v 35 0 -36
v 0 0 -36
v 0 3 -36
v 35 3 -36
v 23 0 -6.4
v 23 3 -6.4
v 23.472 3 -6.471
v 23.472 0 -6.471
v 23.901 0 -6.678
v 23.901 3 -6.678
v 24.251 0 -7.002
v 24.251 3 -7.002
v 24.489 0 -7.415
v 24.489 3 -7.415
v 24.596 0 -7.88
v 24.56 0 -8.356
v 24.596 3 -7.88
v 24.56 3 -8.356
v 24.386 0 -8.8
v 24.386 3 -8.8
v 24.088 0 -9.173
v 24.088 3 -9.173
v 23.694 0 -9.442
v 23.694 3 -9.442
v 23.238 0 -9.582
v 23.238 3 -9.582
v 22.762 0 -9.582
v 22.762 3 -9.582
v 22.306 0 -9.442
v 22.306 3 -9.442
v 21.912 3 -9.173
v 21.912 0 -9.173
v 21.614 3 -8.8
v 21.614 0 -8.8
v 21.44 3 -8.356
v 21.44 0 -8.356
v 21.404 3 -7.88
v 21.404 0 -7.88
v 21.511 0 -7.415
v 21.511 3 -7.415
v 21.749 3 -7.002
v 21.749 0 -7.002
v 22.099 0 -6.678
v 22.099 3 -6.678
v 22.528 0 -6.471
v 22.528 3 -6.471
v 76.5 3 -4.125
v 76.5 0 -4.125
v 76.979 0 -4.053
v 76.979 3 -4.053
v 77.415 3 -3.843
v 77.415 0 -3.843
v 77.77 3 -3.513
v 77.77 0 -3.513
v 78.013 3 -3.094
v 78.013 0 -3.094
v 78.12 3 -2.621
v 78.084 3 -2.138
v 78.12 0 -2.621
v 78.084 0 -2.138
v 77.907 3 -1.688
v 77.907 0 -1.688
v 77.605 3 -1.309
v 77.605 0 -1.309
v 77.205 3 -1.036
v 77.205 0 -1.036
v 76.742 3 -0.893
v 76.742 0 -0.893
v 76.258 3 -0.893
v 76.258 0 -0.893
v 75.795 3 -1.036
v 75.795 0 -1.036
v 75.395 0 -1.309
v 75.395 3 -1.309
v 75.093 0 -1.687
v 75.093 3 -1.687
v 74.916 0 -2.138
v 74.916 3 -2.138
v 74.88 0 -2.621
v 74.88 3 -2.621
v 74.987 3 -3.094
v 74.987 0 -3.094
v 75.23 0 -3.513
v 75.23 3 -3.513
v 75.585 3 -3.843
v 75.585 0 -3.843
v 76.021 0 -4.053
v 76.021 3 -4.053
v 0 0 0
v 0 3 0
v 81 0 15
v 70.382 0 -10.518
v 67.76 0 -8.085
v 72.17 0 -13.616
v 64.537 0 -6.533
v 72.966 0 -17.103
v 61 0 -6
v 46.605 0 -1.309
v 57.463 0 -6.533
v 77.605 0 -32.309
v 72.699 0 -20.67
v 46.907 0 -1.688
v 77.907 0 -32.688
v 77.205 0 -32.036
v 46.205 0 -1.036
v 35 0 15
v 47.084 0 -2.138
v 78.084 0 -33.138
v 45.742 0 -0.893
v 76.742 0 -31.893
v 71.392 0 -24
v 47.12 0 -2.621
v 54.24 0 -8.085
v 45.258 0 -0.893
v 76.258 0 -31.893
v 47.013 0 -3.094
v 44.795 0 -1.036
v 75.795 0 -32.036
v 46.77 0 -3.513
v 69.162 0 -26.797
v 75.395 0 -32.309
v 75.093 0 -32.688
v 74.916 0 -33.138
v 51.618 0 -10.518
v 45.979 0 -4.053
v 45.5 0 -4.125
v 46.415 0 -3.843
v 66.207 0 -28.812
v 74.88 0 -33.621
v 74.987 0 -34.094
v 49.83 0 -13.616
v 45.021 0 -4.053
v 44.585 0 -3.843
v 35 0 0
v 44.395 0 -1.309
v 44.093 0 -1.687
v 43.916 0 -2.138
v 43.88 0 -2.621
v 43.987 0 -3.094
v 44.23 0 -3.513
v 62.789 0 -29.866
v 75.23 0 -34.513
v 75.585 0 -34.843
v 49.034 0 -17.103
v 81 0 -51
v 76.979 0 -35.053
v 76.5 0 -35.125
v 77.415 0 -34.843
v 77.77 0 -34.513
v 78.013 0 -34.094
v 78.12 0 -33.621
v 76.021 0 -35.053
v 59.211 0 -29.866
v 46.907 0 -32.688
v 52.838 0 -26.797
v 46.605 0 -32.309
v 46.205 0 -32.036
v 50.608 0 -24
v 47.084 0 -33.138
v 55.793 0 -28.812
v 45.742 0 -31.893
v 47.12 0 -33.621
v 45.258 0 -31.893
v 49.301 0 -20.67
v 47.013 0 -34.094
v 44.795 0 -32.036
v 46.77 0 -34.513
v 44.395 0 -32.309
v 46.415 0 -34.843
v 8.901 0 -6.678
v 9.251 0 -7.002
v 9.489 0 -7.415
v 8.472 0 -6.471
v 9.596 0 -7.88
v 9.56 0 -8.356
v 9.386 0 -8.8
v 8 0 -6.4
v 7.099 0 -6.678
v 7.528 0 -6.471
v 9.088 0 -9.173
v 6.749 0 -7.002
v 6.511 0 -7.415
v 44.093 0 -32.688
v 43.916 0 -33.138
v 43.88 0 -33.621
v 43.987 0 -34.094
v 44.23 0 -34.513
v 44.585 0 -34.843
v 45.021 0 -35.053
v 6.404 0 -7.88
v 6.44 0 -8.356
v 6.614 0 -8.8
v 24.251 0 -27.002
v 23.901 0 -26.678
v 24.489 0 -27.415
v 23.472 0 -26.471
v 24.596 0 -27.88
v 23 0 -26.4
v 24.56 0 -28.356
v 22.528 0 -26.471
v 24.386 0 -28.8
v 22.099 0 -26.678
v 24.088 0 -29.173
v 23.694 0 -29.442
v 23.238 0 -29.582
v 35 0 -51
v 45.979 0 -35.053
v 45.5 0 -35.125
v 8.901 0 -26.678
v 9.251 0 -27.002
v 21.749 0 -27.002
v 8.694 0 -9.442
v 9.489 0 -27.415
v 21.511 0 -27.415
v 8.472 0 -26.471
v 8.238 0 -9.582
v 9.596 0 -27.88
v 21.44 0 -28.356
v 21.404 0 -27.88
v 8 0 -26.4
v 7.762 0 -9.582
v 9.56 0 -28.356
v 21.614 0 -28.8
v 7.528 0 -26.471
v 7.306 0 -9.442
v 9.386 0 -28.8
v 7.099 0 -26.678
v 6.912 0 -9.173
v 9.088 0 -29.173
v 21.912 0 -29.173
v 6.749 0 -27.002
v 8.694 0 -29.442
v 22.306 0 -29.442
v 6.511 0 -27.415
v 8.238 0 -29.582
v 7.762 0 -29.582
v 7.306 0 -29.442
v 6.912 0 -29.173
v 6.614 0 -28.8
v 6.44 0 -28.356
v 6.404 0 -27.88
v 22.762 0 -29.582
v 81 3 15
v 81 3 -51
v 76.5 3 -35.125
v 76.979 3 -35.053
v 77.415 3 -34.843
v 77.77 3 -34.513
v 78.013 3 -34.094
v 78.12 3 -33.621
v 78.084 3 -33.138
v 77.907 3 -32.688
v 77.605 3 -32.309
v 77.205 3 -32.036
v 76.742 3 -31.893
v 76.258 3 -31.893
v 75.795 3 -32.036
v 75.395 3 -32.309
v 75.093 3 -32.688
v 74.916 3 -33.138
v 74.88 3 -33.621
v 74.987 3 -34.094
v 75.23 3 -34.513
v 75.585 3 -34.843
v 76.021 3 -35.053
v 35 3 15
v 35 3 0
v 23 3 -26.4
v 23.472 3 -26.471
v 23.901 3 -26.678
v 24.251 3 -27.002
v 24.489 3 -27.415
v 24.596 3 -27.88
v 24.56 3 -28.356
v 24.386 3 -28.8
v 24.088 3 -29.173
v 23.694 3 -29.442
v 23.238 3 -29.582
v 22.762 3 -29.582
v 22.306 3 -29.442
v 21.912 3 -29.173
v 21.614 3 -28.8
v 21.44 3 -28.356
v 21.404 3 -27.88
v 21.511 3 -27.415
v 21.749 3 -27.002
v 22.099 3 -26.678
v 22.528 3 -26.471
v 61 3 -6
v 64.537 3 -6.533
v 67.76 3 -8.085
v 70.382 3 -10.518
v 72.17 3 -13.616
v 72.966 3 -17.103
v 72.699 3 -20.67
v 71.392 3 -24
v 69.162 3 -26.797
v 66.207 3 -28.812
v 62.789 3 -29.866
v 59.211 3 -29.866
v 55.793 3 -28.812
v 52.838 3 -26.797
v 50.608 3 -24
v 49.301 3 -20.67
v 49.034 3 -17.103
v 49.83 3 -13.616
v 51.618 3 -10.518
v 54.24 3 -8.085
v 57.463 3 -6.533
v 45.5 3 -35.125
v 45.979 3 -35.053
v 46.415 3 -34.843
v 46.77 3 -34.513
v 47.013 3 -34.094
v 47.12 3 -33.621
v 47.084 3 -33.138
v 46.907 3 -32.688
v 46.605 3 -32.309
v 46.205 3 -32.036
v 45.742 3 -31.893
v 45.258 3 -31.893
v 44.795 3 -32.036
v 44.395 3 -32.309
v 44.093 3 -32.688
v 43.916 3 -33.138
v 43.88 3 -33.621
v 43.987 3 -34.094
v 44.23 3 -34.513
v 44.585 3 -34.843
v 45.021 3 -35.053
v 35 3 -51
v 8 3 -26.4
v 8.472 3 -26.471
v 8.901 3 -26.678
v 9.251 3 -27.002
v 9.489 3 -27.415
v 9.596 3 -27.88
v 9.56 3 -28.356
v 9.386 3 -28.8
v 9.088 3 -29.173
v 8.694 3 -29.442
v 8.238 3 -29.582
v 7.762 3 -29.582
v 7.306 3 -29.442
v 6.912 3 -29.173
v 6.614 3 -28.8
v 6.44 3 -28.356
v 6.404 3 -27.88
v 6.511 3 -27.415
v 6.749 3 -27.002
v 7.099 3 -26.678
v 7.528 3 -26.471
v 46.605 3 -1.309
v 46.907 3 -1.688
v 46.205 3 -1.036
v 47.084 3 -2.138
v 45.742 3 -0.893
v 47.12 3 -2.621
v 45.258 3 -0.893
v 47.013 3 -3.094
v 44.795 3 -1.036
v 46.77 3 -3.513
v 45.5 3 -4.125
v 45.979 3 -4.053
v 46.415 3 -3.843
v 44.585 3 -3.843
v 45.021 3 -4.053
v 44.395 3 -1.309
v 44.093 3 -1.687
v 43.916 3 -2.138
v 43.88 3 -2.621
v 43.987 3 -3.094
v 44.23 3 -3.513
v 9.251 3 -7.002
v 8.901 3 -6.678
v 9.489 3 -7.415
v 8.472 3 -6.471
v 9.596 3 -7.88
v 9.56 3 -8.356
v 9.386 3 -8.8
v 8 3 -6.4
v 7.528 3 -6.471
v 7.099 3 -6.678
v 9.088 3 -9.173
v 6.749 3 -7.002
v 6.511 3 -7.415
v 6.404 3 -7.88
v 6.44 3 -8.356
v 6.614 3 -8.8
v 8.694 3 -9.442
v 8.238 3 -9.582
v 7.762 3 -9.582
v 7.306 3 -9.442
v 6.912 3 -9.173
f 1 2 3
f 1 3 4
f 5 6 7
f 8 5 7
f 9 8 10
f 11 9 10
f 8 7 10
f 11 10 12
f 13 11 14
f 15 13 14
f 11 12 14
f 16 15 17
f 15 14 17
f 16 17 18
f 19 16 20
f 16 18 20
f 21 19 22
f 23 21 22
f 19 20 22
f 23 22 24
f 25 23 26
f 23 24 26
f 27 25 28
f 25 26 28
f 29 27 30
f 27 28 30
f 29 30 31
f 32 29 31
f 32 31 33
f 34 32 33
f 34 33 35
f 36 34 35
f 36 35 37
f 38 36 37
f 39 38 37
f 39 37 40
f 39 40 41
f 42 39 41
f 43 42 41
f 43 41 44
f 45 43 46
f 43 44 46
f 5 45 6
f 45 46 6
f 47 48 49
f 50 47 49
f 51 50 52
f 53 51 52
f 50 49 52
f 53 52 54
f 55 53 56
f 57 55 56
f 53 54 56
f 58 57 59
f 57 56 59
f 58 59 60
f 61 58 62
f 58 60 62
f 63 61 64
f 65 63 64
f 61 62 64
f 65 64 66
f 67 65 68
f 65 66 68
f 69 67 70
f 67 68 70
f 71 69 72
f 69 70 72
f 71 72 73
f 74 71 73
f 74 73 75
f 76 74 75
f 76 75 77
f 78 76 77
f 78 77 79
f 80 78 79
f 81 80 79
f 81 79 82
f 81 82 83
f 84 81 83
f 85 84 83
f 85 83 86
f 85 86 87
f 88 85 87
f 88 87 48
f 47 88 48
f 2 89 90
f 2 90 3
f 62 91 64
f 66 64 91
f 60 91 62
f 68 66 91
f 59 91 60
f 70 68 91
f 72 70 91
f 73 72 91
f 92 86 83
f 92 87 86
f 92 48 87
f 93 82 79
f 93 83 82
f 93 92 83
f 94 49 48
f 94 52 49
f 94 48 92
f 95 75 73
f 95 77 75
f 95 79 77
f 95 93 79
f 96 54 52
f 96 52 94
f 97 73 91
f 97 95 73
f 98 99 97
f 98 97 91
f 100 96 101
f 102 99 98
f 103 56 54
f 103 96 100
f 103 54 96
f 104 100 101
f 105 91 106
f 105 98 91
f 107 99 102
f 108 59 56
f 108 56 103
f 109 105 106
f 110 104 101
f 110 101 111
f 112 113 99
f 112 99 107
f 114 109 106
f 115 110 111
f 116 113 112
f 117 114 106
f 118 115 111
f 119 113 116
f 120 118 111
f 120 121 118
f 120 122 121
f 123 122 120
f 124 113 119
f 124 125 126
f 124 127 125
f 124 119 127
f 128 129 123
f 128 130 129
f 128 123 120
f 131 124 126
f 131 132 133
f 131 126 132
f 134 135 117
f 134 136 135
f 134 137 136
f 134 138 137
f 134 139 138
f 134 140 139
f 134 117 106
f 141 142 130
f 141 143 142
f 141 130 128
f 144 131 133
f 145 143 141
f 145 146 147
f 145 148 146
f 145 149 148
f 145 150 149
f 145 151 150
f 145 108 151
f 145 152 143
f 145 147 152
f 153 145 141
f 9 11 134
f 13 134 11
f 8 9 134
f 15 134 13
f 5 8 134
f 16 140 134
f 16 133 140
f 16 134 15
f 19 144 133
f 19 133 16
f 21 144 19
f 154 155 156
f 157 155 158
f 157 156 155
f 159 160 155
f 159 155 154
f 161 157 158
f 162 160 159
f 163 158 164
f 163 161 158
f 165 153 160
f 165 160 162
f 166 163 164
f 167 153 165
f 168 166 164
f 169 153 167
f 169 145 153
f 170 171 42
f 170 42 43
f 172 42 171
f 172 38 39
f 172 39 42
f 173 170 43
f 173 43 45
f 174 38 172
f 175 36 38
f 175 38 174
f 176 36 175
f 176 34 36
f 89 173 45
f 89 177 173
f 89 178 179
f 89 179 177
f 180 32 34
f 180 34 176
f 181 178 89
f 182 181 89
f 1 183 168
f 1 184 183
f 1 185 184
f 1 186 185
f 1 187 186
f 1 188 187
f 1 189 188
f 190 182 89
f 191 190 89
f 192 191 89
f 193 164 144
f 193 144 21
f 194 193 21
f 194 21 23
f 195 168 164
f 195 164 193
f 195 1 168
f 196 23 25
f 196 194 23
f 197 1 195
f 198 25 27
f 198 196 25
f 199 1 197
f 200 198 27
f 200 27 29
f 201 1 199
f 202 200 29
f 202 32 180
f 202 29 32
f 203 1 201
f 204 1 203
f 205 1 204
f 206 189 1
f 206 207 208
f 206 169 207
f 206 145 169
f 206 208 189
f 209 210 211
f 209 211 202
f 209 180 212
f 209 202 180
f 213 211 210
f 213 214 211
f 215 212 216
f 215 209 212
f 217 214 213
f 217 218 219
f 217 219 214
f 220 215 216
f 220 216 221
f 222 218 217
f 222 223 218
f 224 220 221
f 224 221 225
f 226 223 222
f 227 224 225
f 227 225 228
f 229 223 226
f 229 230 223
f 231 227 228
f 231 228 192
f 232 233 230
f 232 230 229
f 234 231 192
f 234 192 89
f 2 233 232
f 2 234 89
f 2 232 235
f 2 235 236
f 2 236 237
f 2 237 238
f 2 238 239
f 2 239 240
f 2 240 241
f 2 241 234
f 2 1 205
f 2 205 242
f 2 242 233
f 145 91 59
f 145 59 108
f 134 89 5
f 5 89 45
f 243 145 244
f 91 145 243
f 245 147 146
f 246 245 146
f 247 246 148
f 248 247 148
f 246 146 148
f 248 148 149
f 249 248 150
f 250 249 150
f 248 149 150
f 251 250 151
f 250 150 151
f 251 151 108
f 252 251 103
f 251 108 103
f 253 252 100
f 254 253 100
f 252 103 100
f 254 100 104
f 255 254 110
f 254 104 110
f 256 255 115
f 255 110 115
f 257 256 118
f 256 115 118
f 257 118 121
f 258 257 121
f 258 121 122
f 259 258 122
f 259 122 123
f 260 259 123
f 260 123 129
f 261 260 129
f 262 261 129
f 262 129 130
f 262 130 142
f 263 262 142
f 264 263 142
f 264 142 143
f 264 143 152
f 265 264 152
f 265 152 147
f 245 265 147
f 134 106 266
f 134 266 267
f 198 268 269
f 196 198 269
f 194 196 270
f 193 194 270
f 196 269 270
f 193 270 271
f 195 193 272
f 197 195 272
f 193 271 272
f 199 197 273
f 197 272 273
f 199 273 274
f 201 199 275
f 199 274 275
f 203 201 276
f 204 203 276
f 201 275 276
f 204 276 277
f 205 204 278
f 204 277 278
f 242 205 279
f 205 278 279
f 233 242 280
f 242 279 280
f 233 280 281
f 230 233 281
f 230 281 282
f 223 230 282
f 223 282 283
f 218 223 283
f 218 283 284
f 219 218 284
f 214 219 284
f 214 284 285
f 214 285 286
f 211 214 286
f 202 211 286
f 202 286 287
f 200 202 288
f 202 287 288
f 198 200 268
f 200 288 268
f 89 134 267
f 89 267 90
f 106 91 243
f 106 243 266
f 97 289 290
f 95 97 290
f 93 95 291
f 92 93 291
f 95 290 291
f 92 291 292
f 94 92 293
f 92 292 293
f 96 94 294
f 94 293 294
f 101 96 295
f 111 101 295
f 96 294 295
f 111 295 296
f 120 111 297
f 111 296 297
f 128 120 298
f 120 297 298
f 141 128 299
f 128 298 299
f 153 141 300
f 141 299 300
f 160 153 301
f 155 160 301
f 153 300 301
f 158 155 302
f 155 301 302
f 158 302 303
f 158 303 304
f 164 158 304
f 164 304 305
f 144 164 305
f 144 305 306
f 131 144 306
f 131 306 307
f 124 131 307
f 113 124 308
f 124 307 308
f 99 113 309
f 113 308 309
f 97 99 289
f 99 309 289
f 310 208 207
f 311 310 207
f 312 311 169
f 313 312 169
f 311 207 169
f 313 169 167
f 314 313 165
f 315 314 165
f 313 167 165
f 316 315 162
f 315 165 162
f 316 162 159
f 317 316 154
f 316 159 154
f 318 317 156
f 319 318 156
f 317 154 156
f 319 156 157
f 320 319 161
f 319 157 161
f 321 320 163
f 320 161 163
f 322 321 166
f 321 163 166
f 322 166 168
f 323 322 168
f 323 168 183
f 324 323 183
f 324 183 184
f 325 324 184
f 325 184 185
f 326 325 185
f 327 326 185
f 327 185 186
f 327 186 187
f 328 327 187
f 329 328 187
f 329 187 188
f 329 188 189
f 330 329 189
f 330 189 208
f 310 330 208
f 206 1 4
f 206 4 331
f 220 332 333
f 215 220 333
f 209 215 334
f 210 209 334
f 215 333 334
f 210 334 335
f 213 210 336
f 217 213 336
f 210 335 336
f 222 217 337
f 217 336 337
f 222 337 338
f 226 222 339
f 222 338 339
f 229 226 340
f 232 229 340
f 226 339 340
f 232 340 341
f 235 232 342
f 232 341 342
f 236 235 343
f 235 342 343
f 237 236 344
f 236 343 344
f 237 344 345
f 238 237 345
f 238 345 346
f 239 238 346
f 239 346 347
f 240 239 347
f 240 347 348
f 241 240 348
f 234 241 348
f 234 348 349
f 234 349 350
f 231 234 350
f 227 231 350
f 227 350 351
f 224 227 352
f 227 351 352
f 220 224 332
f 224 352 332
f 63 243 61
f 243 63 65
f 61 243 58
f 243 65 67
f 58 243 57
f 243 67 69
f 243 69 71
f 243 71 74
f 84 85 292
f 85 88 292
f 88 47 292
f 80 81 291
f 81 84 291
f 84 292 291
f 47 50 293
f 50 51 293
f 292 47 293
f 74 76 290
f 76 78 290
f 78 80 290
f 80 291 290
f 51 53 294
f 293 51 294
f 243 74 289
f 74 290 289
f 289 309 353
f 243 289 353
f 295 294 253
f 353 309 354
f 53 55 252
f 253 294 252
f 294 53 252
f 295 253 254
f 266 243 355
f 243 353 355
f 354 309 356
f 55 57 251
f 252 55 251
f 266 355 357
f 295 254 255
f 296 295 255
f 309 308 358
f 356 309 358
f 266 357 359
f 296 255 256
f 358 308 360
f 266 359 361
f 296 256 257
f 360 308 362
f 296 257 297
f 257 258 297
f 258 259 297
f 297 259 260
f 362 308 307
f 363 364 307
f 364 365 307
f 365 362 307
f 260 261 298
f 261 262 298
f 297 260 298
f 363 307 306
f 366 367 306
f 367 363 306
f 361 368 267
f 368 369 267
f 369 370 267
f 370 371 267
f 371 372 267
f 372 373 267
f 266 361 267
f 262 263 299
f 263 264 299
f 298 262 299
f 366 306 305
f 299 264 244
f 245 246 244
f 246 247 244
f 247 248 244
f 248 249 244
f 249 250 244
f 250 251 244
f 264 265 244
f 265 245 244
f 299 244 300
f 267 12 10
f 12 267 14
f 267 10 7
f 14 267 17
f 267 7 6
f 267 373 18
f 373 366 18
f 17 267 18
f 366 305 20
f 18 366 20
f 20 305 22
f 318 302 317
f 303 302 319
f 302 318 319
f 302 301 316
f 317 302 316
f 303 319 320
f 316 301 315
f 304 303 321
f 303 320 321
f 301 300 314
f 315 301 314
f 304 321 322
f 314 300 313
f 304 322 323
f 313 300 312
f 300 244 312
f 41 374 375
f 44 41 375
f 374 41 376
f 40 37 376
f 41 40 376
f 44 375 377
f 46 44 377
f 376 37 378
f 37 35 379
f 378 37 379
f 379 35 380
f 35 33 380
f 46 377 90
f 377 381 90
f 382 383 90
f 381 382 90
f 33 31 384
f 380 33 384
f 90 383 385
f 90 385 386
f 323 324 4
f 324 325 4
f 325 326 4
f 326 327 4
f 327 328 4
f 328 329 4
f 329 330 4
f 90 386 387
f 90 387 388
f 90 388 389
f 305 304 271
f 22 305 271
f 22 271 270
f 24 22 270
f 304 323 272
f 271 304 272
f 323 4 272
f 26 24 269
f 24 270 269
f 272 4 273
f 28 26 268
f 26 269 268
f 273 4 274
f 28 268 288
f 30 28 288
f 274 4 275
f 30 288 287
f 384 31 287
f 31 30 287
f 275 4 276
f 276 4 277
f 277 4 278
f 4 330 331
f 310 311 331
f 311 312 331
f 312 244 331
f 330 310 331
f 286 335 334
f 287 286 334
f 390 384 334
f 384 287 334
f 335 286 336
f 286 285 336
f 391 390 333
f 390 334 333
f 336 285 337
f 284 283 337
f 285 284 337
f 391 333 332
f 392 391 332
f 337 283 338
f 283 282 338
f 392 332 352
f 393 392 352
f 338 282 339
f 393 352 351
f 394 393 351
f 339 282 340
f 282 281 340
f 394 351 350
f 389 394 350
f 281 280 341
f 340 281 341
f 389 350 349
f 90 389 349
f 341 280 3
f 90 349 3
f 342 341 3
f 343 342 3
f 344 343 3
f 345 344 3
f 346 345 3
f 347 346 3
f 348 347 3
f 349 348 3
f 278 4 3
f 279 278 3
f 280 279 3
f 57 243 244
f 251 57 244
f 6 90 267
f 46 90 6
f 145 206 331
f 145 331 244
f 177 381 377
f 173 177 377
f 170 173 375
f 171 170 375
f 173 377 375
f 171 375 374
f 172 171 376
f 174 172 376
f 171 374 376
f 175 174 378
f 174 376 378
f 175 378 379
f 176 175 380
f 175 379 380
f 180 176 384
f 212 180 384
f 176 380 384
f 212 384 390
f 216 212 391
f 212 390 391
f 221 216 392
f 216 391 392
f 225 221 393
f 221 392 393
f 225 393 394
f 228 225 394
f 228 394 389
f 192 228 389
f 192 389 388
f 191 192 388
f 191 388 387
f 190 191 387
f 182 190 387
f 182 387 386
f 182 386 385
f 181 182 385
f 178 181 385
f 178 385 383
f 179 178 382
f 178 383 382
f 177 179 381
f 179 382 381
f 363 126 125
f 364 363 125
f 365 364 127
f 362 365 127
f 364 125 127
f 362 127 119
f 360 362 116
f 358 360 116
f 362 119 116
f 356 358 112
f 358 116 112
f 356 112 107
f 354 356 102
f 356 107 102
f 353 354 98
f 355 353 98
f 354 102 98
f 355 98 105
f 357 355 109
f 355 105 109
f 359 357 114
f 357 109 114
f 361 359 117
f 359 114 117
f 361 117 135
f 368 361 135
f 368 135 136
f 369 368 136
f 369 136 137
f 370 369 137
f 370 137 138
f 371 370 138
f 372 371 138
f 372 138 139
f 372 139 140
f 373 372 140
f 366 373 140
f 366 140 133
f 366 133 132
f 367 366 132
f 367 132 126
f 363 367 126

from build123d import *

# Parameters (mm, degrees)
EXTRUDE_1_DEPTH     = 3
SKETCH_2_R          = 1.6
SKETCH_2_R_2        = 12
CUT_EXTRUDE_1_DEPTH = 3
SKETCH_4_R          = 1.625
CUT_EXTRUDE_2_DEPTH = 96.765338197


with BuildPart() as part:
    # 草图1 → 凸台-拉伸1 (new body)
    with BuildSketch(Plane(origin=(0, 0, 0), x_dir=(1, 0, 0), z_dir=(0, 1, 0))):
        Polygon((0, 0), (0, 36), (35, 36), (35, 51), (81, 51), (81, -15), (35, -15), (35, 0), align=None)
    extrude(amount=EXTRUDE_1_DEPTH)

    # 草图2 → 切除-拉伸1 (cut)
    with BuildSketch(Plane(origin=(0, 3, 0), x_dir=(1, 0, 0), z_dir=(0, 1, 0))):
        with Locations(Location((8, 28, 0), (0, 0, 270))):
            Circle(SKETCH_2_R)
        with Locations(Location((23, 28, 0), (0, 0, 270))):
            Circle(SKETCH_2_R)
        with Locations(Location((8, 8, 0), (0, 0, 270))):
            Circle(SKETCH_2_R)
        with Locations(Location((23, 8, 0), (0, 0, 270))):
            Circle(SKETCH_2_R)
        with Locations(Location((61, 18, 0), (0, 0, 270))):
            Circle(SKETCH_2_R_2)
    extrude(amount=-CUT_EXTRUDE_1_DEPTH, mode=Mode.SUBTRACT)

    # 草图4 → 切除-拉伸2 (cut, through all)
    with BuildSketch(Plane.XZ):
        with Locations(Location((45.5, -33.5, 0), (0, 0, 270))):
            Circle(SKETCH_4_R)
        with Locations(Location((76.5, -33.5, 0), (0, 0, 270))):
            Circle(SKETCH_4_R)
        with Locations(Location((76.5, -2.5, 0), (0, 0, 270))):
            Circle(SKETCH_4_R)
        with Locations(Location((45.5, -2.5, 0), (0, 0, 270))):
            Circle(SKETCH_4_R)
    extrude(amount=-CUT_EXTRUDE_2_DEPTH, mode=Mode.SUBTRACT)


solid = part.part
